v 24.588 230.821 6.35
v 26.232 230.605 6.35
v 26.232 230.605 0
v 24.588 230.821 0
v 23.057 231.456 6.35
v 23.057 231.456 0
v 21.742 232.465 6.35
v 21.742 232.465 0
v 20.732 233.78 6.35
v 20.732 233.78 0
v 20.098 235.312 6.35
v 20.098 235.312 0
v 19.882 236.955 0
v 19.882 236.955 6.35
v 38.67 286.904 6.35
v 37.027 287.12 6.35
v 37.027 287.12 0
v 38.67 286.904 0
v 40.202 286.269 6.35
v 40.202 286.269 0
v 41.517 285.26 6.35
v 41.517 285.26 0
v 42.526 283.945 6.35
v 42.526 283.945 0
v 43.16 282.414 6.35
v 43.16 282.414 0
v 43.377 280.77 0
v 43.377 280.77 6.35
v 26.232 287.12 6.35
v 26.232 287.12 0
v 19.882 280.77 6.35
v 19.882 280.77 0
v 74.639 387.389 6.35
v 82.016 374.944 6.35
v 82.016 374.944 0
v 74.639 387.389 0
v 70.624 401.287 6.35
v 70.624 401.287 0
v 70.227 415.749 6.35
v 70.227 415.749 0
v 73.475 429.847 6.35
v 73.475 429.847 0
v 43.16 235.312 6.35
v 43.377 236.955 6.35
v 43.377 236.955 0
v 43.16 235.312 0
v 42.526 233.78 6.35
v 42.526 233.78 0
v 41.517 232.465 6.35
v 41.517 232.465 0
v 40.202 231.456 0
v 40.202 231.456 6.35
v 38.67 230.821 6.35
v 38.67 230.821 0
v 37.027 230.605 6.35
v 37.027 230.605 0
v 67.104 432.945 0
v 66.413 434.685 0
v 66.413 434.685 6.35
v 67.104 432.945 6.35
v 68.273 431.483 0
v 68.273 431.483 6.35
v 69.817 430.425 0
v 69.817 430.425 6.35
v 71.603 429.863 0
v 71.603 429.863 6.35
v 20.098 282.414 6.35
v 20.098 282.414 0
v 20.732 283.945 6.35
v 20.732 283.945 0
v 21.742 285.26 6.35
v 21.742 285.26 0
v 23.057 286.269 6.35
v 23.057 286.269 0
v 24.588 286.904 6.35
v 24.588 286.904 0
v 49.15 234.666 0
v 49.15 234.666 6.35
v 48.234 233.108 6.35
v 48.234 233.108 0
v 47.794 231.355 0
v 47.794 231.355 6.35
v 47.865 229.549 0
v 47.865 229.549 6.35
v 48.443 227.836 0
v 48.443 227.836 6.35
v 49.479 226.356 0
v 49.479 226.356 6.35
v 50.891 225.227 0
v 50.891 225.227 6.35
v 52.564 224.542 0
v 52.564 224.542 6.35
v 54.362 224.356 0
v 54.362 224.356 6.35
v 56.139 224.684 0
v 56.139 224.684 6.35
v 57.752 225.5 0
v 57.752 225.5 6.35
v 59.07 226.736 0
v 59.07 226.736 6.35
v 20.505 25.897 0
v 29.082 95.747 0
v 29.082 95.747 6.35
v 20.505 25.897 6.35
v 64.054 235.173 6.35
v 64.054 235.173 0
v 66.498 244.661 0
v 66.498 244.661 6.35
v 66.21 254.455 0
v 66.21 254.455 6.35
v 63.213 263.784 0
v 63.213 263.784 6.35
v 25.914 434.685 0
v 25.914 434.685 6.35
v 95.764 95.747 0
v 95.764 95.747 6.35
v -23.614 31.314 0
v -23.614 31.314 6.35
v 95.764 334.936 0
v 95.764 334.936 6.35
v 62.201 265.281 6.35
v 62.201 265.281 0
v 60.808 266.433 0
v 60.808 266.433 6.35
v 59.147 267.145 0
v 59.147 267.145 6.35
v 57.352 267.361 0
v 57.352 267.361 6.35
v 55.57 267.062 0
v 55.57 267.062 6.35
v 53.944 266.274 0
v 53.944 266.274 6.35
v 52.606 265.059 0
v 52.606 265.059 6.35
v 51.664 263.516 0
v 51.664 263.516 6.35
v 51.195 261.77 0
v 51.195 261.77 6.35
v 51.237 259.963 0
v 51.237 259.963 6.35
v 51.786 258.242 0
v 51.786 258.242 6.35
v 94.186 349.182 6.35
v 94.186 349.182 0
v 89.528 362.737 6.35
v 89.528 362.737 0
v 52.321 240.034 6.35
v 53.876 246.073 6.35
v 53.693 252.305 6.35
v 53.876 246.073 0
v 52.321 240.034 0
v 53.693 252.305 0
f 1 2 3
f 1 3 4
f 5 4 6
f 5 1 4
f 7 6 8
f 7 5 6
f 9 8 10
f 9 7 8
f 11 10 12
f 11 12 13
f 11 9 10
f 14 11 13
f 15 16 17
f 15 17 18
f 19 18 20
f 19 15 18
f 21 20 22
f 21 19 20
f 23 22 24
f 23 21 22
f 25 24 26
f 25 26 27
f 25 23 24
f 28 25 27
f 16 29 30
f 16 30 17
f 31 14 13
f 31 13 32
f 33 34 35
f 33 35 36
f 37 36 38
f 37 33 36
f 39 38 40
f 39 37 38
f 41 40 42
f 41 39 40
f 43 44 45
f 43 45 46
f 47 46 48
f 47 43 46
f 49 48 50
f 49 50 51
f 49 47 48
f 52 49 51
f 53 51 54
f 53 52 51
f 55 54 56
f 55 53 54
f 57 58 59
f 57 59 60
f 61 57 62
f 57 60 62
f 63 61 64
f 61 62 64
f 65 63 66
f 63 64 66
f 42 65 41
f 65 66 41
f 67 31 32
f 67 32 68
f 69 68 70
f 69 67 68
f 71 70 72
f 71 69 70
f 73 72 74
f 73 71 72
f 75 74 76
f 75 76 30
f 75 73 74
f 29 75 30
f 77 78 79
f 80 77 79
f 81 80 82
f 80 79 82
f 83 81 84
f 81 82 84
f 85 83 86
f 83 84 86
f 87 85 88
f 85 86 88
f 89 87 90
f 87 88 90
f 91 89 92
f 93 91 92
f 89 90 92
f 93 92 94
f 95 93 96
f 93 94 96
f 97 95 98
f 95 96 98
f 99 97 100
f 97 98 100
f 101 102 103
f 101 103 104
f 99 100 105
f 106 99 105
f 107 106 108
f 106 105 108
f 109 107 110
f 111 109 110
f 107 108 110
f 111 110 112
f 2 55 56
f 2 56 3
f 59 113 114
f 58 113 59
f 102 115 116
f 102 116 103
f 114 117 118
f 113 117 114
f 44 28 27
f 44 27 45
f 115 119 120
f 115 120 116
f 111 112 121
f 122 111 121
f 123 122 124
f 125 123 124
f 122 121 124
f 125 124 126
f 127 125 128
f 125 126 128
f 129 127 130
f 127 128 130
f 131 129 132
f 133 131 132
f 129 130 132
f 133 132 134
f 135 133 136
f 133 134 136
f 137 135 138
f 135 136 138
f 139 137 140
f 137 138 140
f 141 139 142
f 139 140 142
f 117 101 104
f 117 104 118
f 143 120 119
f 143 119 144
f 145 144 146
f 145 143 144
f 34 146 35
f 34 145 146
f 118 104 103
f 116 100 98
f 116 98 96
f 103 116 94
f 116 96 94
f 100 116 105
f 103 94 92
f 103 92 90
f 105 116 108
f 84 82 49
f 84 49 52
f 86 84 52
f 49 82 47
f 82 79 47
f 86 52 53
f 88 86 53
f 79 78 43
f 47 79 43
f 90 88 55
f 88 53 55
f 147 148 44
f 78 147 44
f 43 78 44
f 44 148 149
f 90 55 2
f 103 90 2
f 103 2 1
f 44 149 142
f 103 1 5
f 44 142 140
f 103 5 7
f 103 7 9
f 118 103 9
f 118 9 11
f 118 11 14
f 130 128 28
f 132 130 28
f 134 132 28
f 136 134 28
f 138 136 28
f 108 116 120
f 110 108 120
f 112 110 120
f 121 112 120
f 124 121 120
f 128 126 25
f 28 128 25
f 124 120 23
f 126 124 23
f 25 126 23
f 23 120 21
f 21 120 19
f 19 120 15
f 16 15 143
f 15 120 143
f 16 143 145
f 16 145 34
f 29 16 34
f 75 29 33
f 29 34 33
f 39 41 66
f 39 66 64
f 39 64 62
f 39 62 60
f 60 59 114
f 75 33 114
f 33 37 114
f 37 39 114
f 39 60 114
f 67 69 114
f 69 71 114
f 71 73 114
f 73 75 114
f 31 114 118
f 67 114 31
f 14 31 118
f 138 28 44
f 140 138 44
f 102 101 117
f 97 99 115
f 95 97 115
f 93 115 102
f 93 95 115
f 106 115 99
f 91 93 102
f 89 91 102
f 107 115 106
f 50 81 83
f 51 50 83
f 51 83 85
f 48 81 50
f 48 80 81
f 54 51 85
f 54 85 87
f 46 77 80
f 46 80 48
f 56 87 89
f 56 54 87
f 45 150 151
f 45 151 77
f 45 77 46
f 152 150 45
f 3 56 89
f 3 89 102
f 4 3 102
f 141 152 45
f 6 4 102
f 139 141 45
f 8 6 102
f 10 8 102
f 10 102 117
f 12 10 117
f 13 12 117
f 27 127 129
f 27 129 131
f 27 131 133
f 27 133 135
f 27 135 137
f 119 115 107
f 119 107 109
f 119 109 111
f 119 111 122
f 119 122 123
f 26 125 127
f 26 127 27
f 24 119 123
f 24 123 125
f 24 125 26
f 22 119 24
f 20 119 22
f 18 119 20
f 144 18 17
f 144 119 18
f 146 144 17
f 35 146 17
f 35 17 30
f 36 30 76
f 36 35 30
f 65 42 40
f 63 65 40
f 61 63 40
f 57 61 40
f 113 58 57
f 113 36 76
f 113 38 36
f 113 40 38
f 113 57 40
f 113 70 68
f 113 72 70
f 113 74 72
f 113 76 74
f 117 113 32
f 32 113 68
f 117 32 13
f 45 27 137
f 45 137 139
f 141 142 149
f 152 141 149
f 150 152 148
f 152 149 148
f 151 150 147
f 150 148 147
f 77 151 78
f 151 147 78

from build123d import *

# Parameters (mm, degrees)
BOSS_EXTRUDE1_DEPTH = 6.35
SKETCH2_R           = 6.35
CUT_EXTRUDE1_DEPTH  = 6.35
CUT_EXTRUDE3_DEPTH  = 6.35
CUT_EXTRUDE4_DEPTH  = 6.35
CUT_EXTRUDE6_DEPTH  = 6.35


with BuildPart() as part:
    # Sketch1 → Boss-Extrude1 (new body)
    with BuildSketch(Plane.XY):
        Polygon((20.505148302, 25.897062134), (-23.613528139, 31.314154449), (25.914173021, 434.684910476), (95.764173021, 434.684910476), (95.764173021, 95.747062134), (29.081649881, 95.747062134), align=None)
    extrude(amount=BOSS_EXTRUDE1_DEPTH)

    # Sketch2 → Cut-Extrude1 (cut)
    with BuildSketch(Plane.XY.offset(6.35)):
        with Locations((72.594859494, 436.135448726)):
            Circle(SKETCH2_R)
    extrude(amount=-CUT_EXTRUDE1_DEPTH, mode=Mode.SUBTRACT)

    # Sketch3 → Cut-Extrude3 (cut)
    with BuildSketch(Plane.XY.offset(6.35)):
        with BuildLine():
            ThreePointArc((59.06996097, 226.736339707), (66.497801827, 244.661042374), (63.213102929, 263.783765471))
            ThreePointArc((63.213102929, 263.783765471), (54.728545327, 266.726091472), (51.786219326, 258.24153387))
            ThreePointArc((51.786219326, 258.24153387), (53.876482261, 246.072528262), (49.149674443, 234.665899293))
            ThreePointArc((49.149674443, 234.665899293), (50.145037914, 225.740976236), (59.06996097, 226.736339707))
        make_face()
    extrude(amount=-CUT_EXTRUDE3_DEPTH, mode=Mode.SUBTRACT)

    # Sketch4 → Cut-Extrude4 (cut)
    with BuildSketch(Plane.XY.offset(6.35)):
        with BuildLine():
            Line((74.295018445, 431.943320697), (82.016159891, 440.361424689))
            Line((82.016159891, 440.361424689), (105.989857785, 438.164600241))
            Line((105.989857785, 438.164600241), (95.764173021, 334.935994434))
            ThreePointArc((95.764173021, 334.935994434), (92.231289046, 356.088107858), (82.016159891, 374.943990437))
            ThreePointArc((82.016159891, 374.943990437), (70.461962448, 402.401475249), (74.295018445, 431.943320697))
        make_face()
    extrude(amount=-CUT_EXTRUDE4_DEPTH, mode=Mode.SUBTRACT)

    # Sketch5 → Cut-Extrude6 (cut)
    with BuildSketch(Plane.XY.offset(6.35)):
        with BuildLine():
            Line((26.231673021, 287.120128567), (37.026673021, 287.120128567))
            ThreePointArc((37.026673021, 287.120128567), (41.516801082, 285.260256628), (43.376673021, 280.770128567))
            Line((43.376673021, 280.770128567), (43.376673021, 236.955128567))
            ThreePointArc((43.376673021, 236.955128567), (41.516801082, 232.465000507), (37.026673021, 230.605128567))
            Line((37.026673021, 230.605128567), (26.231673021, 230.605128567))
            ThreePointArc((26.231673021, 230.605128567), (21.74154496, 232.465000507), (19.881673021, 236.955128567))
            Line((19.881673021, 236.955128567), (19.881673021, 280.770128567))
            ThreePointArc((19.881673021, 280.770128567), (21.74154496, 285.260256628), (26.231673021, 287.120128567))
        make_face()
    extrude(amount=-CUT_EXTRUDE6_DEPTH, mode=Mode.SUBTRACT)


solid = part.part
